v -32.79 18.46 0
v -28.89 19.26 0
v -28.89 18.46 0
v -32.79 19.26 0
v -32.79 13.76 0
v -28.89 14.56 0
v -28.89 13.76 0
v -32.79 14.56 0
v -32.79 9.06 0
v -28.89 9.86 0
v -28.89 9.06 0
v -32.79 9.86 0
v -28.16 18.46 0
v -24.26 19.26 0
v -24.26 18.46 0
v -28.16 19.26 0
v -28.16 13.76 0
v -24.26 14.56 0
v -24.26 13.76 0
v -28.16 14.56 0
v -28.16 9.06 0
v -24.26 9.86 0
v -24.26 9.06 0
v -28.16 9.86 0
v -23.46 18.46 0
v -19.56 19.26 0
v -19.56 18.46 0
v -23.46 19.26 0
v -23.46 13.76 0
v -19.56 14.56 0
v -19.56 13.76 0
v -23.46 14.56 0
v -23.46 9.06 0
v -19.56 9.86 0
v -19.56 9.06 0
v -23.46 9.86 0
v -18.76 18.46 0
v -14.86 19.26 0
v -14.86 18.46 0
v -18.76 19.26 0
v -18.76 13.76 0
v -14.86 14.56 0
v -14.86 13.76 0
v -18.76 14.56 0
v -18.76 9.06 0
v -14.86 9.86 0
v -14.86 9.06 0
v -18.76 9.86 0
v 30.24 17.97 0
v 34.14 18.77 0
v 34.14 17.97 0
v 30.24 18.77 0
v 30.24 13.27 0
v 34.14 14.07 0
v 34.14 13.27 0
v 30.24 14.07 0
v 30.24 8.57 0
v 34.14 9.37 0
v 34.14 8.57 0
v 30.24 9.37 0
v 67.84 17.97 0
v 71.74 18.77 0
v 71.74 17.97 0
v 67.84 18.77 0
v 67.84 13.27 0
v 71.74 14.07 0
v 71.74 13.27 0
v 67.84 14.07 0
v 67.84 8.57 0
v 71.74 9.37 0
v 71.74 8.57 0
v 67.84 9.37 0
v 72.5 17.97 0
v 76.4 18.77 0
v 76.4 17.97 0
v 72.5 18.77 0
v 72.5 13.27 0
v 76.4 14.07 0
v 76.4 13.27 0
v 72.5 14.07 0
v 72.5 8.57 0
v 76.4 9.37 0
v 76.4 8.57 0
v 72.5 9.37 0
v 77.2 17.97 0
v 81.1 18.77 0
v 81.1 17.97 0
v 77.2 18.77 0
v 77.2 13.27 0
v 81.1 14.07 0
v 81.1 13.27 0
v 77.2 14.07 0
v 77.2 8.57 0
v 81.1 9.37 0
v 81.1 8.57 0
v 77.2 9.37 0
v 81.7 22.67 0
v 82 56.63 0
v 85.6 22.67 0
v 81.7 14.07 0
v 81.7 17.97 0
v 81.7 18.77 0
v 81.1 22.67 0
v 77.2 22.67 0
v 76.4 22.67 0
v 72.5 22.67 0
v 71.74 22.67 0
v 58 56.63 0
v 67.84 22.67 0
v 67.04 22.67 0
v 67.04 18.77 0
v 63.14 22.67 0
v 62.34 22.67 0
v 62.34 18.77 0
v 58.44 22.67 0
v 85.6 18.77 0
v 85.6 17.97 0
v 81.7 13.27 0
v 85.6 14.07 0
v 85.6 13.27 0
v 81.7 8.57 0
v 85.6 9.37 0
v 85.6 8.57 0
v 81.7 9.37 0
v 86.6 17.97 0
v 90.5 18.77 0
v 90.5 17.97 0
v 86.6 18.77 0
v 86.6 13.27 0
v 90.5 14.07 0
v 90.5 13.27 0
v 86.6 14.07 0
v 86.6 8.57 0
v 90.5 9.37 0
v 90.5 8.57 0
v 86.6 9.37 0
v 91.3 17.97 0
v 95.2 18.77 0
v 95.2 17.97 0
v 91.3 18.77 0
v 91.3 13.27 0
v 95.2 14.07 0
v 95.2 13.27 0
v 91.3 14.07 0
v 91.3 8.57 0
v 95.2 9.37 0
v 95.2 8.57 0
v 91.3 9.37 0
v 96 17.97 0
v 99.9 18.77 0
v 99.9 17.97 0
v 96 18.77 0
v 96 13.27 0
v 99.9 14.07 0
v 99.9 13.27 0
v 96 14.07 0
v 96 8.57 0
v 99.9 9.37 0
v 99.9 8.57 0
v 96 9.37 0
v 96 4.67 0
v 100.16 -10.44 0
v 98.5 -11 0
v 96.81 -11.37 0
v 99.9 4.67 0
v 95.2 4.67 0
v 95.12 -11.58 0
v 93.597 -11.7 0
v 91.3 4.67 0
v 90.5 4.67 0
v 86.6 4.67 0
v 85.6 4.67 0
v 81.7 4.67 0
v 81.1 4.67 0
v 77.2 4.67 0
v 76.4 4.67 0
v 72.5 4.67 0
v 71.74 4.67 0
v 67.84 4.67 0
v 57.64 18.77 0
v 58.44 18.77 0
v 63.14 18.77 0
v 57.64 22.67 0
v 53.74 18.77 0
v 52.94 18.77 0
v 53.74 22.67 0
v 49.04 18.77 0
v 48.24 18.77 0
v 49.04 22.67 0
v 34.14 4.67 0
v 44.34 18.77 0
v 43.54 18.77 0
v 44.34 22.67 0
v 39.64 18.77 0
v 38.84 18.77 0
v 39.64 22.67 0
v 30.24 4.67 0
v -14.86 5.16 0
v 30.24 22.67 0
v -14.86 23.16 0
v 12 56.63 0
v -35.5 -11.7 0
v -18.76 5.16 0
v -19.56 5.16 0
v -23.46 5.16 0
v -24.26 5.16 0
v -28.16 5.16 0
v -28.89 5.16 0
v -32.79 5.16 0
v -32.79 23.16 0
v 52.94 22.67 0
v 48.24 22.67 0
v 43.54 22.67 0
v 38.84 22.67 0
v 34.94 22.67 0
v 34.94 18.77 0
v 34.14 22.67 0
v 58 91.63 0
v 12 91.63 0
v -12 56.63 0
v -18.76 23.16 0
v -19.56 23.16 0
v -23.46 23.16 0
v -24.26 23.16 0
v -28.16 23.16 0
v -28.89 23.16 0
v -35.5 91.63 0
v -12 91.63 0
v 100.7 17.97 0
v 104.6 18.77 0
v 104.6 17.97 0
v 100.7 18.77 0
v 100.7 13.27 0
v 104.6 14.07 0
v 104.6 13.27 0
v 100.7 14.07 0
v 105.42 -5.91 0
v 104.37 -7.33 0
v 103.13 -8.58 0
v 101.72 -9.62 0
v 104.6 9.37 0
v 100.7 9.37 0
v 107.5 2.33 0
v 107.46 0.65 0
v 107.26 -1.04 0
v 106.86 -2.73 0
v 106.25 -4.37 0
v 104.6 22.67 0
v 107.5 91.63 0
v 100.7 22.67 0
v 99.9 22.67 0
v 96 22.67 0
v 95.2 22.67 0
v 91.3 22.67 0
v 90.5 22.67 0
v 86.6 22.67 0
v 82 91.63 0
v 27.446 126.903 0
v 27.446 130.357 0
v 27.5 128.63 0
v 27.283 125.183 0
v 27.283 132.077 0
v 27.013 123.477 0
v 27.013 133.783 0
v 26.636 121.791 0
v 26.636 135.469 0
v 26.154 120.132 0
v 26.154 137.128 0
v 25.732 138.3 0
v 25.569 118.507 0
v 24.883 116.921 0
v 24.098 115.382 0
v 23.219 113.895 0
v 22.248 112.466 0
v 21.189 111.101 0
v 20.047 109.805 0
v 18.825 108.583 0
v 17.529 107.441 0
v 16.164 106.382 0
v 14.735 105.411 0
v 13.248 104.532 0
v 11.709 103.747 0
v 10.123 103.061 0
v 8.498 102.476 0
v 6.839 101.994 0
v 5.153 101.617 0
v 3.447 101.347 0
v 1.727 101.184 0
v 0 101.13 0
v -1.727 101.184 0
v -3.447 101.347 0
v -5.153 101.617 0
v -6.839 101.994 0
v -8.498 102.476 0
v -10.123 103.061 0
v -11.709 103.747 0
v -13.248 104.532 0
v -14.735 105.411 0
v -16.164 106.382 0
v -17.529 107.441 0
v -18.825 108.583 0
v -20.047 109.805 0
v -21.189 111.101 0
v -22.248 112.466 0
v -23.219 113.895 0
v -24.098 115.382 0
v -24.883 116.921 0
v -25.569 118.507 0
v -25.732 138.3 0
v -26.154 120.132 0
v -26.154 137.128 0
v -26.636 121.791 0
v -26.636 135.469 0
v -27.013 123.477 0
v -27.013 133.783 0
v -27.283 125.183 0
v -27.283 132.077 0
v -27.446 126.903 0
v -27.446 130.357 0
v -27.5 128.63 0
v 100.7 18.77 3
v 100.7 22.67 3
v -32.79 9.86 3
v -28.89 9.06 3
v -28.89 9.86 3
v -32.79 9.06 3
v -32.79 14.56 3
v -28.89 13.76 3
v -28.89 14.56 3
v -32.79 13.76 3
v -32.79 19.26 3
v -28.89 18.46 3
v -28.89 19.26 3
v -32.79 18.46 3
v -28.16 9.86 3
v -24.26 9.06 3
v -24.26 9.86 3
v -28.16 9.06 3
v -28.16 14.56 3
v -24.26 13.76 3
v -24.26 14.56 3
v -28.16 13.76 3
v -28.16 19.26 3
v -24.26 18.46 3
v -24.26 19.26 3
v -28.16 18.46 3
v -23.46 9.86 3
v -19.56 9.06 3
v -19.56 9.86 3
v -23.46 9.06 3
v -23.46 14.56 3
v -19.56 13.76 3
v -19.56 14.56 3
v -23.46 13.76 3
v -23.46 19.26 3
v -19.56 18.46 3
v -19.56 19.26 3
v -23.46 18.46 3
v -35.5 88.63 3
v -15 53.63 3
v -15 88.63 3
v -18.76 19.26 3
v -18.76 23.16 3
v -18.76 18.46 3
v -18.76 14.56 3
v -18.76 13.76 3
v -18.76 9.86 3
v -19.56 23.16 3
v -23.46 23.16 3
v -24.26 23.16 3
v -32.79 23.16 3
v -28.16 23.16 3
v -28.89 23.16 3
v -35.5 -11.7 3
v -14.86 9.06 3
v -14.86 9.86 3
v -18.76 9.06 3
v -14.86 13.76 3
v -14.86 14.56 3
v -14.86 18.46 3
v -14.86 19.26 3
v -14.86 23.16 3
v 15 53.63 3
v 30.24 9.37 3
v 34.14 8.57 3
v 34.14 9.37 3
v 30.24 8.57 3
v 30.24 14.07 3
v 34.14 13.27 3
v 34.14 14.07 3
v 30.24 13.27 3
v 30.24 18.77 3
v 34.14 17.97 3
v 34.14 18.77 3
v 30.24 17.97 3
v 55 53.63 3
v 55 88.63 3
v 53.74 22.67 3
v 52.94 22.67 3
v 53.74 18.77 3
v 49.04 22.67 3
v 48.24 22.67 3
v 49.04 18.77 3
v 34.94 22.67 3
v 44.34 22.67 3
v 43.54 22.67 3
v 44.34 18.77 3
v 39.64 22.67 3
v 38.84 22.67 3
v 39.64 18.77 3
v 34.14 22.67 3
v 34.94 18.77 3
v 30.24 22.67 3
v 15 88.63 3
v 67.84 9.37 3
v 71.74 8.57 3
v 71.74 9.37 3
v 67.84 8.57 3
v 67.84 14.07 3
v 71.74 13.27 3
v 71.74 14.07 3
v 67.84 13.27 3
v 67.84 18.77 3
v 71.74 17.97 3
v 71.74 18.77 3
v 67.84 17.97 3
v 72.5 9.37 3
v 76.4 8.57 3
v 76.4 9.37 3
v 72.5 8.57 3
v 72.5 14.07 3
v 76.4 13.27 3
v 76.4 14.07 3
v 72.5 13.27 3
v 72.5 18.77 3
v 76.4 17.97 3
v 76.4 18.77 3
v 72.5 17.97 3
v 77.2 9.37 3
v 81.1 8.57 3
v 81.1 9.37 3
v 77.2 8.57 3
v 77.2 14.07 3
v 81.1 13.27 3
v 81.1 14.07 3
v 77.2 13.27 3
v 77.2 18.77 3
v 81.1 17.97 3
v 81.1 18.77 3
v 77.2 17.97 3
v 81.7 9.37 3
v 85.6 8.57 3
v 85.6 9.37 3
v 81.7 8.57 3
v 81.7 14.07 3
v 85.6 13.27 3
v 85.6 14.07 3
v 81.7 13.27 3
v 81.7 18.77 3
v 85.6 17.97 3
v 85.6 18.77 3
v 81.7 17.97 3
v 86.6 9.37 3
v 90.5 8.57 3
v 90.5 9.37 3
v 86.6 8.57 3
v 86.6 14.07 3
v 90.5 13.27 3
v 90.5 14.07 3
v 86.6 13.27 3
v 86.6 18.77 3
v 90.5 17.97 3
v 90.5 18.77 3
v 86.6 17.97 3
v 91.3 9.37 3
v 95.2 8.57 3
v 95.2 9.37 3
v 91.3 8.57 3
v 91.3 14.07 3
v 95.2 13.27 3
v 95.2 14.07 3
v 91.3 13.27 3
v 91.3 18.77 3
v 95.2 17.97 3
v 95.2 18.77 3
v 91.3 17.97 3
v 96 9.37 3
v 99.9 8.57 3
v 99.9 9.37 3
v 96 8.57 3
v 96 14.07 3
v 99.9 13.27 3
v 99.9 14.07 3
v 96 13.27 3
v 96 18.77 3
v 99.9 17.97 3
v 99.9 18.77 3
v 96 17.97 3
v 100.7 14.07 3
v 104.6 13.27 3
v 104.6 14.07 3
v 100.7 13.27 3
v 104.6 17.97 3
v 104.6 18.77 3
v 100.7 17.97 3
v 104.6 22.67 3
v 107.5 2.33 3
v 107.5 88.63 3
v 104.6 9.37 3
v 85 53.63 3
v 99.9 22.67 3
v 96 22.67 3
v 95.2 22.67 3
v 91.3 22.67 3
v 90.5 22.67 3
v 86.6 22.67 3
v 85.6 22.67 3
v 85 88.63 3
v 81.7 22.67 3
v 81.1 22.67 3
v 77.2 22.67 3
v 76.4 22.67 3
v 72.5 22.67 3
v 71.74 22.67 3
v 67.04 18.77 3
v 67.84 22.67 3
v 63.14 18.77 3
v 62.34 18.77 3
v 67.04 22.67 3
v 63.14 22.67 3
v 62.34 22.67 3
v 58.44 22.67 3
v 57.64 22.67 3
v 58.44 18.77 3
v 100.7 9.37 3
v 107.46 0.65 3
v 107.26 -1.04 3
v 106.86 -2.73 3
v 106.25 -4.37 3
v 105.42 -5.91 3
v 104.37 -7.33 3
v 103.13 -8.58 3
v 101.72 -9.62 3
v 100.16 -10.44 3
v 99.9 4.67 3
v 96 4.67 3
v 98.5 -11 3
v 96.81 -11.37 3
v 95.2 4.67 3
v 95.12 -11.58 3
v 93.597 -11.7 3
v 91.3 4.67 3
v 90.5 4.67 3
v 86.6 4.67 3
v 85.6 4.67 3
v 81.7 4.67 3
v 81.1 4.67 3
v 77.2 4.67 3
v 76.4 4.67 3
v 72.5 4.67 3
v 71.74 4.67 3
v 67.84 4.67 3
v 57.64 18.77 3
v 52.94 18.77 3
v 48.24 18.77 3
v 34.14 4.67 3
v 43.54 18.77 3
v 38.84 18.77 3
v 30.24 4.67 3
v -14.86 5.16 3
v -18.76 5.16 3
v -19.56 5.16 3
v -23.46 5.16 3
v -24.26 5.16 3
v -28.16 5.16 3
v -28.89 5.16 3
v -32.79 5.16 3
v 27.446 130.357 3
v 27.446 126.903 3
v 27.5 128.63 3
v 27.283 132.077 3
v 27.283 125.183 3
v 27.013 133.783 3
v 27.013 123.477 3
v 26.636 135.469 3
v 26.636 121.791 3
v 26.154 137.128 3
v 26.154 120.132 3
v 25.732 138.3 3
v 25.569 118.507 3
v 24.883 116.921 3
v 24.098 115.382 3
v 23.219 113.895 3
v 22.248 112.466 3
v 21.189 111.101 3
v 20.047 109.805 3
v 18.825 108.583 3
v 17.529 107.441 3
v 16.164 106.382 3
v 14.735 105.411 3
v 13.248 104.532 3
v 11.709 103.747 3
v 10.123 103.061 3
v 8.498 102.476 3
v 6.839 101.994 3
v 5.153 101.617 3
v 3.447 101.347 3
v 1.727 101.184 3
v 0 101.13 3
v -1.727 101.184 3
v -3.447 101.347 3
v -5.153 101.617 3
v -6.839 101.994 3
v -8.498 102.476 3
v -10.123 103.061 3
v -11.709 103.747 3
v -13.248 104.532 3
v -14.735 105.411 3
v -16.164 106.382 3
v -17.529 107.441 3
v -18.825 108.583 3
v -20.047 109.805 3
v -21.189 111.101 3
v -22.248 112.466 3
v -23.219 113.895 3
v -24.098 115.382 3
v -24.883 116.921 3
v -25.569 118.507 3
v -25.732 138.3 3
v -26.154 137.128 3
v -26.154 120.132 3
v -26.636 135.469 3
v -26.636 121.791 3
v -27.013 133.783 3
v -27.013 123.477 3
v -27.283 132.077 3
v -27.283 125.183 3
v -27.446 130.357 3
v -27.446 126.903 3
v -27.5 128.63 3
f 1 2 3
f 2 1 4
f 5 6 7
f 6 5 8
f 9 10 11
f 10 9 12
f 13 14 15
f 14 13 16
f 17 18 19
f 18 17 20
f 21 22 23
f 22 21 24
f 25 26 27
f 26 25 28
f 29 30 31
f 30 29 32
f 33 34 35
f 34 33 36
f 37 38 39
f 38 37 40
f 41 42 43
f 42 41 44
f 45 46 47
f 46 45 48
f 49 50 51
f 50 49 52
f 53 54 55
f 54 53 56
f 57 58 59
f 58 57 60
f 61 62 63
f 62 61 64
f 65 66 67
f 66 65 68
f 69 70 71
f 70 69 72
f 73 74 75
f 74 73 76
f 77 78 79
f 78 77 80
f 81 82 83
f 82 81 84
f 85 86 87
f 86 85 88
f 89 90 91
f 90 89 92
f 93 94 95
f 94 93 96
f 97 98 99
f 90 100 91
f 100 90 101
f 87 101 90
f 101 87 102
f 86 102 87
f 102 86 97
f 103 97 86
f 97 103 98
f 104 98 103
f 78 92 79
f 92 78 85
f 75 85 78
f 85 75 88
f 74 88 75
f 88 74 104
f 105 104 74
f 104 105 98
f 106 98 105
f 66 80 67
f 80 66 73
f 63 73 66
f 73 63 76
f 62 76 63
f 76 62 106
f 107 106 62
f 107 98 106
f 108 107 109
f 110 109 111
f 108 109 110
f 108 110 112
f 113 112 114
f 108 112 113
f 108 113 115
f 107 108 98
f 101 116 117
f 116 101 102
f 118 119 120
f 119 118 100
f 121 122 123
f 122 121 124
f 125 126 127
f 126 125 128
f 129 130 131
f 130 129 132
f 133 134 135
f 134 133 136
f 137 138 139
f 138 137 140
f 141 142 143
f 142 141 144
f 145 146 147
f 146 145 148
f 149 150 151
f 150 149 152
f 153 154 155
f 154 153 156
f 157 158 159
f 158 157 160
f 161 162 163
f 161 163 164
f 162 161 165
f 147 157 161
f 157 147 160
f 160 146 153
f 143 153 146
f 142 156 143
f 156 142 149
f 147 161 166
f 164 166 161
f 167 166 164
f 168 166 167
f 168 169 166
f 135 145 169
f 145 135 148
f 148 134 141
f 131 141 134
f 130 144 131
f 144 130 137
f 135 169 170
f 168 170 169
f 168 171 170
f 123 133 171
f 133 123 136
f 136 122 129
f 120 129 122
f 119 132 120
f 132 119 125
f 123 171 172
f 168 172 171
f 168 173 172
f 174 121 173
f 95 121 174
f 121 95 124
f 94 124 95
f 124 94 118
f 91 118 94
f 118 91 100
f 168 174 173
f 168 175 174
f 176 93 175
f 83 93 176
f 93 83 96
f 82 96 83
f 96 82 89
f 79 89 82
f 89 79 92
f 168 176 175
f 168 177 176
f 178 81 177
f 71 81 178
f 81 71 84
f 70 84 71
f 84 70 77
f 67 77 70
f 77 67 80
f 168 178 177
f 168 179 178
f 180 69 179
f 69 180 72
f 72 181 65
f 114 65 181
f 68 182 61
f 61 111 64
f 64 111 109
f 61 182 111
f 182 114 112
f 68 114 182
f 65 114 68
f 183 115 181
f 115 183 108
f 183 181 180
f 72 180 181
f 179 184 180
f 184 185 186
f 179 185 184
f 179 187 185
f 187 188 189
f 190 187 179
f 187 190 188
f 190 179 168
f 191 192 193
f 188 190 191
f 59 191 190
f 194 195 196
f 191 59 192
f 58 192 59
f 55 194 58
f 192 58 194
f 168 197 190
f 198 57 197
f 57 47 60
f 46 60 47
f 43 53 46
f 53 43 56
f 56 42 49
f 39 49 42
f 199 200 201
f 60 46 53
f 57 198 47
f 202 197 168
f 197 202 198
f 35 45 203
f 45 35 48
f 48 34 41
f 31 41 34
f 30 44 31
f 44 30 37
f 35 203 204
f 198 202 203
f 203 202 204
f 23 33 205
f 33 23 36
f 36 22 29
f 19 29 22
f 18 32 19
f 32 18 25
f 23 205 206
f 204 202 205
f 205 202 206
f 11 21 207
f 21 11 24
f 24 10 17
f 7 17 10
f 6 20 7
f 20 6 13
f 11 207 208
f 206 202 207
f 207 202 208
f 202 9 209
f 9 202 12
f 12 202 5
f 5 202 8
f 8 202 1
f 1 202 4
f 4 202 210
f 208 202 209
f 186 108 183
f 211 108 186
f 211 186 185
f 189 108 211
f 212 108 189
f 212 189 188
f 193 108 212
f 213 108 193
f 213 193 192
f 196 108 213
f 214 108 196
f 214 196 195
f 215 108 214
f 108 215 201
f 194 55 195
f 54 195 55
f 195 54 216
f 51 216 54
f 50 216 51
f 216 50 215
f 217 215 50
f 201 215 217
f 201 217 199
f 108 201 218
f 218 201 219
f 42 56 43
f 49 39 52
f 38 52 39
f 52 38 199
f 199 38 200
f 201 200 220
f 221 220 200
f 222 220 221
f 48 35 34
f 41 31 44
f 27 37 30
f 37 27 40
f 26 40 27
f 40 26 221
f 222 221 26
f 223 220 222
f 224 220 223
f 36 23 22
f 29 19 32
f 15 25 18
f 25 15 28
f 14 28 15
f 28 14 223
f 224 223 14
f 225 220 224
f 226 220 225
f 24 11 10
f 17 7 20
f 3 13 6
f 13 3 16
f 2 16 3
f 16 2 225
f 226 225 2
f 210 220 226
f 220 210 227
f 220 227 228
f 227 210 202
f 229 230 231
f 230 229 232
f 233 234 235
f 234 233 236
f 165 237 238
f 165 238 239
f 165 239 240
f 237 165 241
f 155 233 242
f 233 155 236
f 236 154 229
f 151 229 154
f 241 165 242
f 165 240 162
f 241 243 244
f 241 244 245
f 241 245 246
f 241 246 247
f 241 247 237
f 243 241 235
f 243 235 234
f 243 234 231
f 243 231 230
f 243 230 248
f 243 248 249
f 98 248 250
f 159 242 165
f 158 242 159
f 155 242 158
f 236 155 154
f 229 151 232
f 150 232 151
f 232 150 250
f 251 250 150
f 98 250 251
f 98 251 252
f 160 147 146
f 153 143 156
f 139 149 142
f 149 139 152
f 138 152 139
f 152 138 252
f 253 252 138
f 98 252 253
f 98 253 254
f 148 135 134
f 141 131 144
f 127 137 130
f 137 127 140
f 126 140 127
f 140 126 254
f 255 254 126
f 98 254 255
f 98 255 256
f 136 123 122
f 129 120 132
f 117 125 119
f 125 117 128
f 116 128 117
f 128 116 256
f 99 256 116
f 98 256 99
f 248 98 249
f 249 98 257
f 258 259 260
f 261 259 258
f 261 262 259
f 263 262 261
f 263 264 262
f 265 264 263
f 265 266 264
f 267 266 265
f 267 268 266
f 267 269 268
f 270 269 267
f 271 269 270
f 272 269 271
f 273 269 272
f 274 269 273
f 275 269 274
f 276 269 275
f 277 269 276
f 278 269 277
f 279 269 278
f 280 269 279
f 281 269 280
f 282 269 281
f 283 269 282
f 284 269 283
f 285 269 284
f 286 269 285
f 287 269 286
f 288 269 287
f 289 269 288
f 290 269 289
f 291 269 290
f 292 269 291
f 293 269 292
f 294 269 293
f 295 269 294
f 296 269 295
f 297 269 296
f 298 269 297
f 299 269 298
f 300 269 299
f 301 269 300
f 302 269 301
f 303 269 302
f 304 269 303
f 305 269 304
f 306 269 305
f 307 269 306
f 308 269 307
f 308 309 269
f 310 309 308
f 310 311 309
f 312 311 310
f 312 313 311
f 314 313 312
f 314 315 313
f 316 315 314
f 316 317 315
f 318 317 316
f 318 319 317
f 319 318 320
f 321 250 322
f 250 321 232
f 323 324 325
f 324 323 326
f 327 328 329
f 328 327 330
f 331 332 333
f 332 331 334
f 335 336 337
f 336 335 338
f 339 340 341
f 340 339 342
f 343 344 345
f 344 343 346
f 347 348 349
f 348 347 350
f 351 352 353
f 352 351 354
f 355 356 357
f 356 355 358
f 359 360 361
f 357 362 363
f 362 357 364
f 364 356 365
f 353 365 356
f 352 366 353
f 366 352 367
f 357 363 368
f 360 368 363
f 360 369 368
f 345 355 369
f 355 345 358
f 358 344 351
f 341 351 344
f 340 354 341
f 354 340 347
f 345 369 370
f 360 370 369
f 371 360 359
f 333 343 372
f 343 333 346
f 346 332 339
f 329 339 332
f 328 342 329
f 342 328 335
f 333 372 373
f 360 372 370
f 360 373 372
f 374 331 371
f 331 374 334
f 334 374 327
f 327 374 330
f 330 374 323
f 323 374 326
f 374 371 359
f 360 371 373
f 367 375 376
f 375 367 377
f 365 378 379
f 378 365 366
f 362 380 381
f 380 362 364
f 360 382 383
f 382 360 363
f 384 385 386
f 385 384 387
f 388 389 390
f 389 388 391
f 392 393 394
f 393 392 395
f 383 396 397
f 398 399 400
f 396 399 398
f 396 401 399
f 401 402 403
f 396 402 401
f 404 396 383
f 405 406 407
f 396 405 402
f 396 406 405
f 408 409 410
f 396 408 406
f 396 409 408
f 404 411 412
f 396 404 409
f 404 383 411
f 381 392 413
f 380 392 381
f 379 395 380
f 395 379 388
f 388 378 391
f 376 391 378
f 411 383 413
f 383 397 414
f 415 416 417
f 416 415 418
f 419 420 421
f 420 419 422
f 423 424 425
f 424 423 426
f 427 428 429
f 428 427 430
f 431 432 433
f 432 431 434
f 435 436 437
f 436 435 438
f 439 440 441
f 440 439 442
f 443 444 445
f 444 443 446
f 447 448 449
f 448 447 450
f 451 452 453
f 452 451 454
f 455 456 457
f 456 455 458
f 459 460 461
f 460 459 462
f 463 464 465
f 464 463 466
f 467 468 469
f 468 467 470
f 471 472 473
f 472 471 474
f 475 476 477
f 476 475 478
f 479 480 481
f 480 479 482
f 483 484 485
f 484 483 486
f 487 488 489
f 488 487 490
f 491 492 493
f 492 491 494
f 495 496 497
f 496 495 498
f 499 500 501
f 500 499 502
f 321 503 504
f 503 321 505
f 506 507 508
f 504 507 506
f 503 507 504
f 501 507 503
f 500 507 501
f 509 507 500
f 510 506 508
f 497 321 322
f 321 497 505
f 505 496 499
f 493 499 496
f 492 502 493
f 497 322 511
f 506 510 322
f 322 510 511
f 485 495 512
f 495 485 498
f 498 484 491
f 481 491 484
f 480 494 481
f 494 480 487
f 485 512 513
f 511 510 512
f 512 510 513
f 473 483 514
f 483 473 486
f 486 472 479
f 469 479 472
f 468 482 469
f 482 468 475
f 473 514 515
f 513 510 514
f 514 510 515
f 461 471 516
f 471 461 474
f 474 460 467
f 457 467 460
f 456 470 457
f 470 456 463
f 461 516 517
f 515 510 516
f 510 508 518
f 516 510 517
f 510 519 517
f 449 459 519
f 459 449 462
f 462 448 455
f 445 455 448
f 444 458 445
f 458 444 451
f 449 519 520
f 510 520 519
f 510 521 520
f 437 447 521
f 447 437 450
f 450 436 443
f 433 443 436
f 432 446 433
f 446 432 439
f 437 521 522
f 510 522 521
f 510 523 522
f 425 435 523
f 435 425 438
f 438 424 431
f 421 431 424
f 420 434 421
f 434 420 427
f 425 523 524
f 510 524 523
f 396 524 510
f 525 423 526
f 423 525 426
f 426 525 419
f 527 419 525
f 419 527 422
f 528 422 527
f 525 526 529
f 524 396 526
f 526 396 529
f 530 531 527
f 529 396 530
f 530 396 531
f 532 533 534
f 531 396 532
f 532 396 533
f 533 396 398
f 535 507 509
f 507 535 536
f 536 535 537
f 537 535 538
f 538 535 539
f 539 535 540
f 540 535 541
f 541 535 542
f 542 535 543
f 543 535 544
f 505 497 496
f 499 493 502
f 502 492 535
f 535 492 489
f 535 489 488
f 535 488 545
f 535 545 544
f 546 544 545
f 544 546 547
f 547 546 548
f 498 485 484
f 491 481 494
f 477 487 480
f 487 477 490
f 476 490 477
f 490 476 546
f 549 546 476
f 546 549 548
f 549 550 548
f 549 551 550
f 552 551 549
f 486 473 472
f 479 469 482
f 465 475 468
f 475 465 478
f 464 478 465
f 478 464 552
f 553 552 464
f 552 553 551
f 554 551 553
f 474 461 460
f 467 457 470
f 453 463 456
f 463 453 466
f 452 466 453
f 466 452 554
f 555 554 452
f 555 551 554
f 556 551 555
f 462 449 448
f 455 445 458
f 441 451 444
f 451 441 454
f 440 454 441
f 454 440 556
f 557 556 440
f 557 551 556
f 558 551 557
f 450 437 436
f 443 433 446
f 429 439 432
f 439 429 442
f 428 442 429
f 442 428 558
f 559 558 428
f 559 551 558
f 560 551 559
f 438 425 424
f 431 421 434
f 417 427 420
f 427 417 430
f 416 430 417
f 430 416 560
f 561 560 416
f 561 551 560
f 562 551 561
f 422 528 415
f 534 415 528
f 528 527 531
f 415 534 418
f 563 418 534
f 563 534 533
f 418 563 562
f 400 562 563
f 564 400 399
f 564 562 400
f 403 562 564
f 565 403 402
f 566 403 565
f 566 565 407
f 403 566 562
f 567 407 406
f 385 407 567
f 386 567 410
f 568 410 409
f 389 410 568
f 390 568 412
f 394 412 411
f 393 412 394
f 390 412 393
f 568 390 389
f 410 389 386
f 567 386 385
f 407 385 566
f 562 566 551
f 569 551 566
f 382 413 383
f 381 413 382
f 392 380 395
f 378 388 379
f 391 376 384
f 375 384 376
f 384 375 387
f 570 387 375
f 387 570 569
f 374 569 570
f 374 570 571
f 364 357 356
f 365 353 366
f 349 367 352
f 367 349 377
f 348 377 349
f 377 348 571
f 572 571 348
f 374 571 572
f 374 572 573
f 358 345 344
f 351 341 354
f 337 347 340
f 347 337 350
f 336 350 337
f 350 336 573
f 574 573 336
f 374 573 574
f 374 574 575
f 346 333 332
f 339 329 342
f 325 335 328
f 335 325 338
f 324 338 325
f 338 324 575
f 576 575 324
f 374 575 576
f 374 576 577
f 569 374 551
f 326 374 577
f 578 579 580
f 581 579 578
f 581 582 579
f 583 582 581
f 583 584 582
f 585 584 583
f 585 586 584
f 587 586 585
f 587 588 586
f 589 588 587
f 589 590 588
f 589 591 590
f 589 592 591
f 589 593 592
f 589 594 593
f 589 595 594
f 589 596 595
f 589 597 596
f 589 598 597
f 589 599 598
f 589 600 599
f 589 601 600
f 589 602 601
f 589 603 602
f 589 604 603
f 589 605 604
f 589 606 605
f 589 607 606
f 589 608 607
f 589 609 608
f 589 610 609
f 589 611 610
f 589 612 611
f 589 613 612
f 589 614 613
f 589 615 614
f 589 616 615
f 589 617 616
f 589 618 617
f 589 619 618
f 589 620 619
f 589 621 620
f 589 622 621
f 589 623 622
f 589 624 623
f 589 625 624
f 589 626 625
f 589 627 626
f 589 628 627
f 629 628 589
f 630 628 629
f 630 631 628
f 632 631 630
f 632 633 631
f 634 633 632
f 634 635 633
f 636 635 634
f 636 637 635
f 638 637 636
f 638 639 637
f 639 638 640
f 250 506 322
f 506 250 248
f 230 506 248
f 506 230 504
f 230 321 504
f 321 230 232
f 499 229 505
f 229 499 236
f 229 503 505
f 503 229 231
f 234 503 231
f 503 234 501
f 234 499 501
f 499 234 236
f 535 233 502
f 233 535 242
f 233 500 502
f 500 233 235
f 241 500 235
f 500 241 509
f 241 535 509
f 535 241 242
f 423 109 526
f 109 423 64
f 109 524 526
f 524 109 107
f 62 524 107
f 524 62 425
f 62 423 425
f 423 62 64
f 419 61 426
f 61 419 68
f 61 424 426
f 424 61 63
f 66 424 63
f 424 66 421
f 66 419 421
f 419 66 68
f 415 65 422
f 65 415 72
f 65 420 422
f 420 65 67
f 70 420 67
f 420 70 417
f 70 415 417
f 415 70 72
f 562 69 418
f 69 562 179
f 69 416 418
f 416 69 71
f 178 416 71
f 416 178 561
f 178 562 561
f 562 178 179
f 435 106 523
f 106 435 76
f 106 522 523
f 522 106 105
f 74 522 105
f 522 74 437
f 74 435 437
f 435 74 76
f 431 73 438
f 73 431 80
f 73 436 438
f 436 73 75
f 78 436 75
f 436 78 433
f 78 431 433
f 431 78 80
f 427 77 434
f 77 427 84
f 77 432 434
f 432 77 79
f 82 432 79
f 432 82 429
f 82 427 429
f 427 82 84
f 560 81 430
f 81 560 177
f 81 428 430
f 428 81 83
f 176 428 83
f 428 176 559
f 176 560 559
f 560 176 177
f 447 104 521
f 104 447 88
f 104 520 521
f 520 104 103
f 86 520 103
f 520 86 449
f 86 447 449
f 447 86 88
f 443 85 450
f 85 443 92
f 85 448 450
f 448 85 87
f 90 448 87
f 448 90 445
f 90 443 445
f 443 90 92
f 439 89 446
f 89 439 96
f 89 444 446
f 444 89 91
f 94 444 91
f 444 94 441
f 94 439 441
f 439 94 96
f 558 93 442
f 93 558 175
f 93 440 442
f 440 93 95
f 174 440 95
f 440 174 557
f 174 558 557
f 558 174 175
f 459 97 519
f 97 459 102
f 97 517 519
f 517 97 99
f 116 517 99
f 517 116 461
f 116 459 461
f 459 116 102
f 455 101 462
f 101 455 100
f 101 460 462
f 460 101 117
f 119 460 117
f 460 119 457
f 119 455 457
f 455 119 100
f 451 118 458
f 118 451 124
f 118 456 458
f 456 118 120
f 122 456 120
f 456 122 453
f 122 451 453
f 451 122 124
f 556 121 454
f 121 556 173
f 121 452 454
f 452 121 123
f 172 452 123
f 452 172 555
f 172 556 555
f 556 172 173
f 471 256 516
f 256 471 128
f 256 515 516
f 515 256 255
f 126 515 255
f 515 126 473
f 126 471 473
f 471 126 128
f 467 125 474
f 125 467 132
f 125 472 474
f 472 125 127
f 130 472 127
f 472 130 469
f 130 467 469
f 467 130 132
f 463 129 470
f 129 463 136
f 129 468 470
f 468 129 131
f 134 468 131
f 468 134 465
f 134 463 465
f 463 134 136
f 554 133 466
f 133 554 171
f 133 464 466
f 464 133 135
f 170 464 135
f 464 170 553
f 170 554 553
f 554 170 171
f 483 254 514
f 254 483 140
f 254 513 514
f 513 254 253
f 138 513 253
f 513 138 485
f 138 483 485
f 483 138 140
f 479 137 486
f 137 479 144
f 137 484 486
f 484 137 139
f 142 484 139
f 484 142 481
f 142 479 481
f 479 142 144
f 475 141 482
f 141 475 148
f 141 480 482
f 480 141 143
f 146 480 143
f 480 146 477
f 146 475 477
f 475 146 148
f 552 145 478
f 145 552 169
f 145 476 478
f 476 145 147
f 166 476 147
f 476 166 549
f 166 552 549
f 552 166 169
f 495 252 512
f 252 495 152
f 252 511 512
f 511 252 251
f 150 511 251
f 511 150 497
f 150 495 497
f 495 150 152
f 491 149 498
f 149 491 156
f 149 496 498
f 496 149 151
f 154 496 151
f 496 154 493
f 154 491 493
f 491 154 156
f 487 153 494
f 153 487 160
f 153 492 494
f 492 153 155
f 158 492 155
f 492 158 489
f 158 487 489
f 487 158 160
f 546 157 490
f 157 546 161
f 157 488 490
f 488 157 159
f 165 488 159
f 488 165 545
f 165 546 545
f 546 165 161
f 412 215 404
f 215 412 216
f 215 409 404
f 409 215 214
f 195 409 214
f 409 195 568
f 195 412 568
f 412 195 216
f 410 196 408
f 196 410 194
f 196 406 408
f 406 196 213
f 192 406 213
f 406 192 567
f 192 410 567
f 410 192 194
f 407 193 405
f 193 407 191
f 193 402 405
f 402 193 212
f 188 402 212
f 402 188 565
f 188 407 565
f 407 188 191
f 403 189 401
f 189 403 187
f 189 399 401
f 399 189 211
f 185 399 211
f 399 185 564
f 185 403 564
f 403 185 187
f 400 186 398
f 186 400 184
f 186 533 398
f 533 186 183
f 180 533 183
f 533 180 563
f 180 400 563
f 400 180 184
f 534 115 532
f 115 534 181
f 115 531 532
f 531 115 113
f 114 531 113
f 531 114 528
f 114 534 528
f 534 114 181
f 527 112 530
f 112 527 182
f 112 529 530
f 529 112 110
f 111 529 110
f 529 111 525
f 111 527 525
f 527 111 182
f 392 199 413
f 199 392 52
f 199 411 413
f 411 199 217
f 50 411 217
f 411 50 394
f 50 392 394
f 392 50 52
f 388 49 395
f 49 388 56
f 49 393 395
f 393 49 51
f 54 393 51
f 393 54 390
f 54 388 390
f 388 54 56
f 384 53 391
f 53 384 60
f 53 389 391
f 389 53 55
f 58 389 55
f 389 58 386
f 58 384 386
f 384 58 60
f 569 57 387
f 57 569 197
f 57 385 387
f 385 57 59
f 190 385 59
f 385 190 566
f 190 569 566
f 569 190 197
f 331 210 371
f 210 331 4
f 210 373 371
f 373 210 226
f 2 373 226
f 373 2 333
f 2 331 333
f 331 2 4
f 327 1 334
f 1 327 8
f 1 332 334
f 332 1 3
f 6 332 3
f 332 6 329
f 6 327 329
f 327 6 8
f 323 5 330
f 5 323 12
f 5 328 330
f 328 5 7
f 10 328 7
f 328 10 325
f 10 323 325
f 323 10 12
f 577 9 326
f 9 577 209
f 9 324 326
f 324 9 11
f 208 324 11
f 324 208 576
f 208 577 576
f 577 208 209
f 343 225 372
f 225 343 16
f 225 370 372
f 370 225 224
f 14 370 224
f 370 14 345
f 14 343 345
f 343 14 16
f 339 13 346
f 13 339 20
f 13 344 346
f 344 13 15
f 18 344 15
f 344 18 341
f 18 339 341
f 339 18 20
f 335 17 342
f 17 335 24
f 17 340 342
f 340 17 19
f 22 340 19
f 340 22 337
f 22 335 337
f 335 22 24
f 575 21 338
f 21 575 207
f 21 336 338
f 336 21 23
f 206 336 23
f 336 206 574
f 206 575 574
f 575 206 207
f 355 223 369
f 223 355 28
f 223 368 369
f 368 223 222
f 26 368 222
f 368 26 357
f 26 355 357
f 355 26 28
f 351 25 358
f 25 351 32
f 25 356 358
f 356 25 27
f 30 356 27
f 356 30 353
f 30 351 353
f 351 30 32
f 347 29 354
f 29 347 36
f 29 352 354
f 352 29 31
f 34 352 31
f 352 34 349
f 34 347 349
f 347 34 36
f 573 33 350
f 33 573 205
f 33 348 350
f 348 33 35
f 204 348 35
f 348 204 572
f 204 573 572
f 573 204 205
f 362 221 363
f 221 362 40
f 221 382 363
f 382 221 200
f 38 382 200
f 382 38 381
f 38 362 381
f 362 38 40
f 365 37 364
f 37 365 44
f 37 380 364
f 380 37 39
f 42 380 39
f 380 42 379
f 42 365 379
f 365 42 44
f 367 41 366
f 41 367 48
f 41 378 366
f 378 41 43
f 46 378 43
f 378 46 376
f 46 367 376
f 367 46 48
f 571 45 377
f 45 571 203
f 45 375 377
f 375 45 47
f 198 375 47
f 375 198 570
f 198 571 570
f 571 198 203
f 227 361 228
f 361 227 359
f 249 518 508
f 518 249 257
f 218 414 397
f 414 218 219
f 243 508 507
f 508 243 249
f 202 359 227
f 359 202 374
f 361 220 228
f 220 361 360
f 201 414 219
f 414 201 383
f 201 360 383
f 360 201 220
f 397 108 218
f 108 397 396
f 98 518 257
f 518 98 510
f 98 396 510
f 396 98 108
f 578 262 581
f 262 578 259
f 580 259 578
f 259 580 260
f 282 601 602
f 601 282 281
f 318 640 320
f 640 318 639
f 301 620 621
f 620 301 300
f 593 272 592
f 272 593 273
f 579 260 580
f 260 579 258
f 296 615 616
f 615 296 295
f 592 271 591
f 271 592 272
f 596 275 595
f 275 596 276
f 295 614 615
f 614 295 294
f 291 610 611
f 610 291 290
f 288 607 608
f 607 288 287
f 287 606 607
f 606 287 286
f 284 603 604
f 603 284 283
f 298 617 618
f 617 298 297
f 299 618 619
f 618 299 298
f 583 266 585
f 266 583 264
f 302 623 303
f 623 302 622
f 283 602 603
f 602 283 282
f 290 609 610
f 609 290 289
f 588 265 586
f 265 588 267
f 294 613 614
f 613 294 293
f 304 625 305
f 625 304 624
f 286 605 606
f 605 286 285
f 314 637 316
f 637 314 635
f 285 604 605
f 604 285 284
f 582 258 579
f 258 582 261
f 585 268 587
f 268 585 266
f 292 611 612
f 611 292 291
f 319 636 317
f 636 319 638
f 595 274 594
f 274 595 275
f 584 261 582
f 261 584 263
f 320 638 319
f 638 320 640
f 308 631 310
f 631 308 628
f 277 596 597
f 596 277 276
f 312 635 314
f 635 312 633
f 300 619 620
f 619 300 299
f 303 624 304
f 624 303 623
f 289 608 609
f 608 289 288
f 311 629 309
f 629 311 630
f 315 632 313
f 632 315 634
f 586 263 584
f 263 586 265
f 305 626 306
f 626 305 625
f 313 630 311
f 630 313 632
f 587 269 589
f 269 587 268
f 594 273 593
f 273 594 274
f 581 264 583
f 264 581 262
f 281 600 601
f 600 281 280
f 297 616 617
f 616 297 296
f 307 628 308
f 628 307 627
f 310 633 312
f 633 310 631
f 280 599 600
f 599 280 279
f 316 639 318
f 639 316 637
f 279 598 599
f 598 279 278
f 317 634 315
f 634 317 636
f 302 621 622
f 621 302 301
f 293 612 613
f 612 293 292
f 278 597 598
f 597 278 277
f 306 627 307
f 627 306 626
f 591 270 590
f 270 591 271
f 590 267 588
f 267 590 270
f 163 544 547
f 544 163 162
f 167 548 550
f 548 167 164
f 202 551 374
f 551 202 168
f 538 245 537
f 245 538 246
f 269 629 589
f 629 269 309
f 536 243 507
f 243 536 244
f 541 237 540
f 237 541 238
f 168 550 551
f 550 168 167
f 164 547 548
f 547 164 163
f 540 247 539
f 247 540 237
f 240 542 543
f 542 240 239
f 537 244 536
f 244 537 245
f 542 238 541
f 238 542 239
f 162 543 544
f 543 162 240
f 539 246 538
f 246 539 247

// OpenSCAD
th = 3.0;
lg = 500;
plg = 150;

module corner() {
    translate([-18.79, -18.79]) polygon([
        [18.79, 0.0], [18.79, 1.56], [18.79, 3.13], [18.79, 4.76], 
        [18.75, 6.44], [18.55, 8.13], [18.15, 9.82], [17.54, 11.46], 
        [16.71, 13.0], [15.66, 14.42], [14.42, 15.67], [13.01, 16.71], 
        [11.45, 17.53], [9.79, 18.09], [8.1, 18.46], [6.41, 18.67], 
        [4.76, 18.8], [3.15, 18.86], [1.56, 18.86], [0.0, 18.79],
        [18.79, 18.79]
    ]);
}

module mag() {
    linear_extrude(3.0) square(3.9, center=true);
}

module slot(dx, dy) {
    sd = 3; // shrink dimension
    
//    translate([dx/2, dy/2])
//    linear_extrude(th, scale=[(dx-sd*2)/dx, (dy-sd*2)/dy])
//        square([dx, dy], center=true);
    
    linear_extrude(th, scale=[dx/(dx-sd*2), dy/(dy-sd*2)])
        square([dx-sd*2, dy-sd*2], center=true);
    
}

// ipad 11inch dimension: 178.52 x 247.64 mm
// ipad 12.9inch dimension: 215.00 x 280.66 mm
// smart connector dimensions are the same
// smart connector center plate to the closest edge distance: 10 + 3.4/2 = 11.7mm

module lower_part_centered_plate_2d() {
    mirror([1,0,0]) translate([-215.00/2,-11.7]) difference() {
        square([143, plg]);
        rotate(180) corner();
    }
}

module upper_part_centered_plate_2d() {
    w = plg;// plate width
    mirror([1,0,0]) translate([-215.00/2,280.66-11.7-w]) difference() {
        square([143, w]);
        translate([0,w]) mirror([0,1]) difference() {
            c = 33; // cut square side length
            r = 6;
            square(c);
            translate([c-13.41,c-13.41]) polygon([[13.41, 0.0], [13.41, 1.11], [13.41, 2.24], [13.41, 3.4], [13.42, 4.61], [13.39, 5.87], [13.24, 7.16], [12.92, 8.44], [12.39, 9.65], [11.65, 10.73], [10.73, 11.65], [9.65, 12.39], [8.44, 12.92], [7.16, 13.24], [5.87, 13.39], [4.61, 13.42], [3.4, 13.41], [2.24, 13.41], [1.11, 13.41], [0.0, 13.41], [13.41,13.41]]);
            
            //mirror([0,1]) rotate(180) corner();
        }
    }
}

module lower_part_magnets() {
    for(ty=[20.72, 16.02, 11.32])
        translate([102.65,ty]) mag(); // right-most 1x3  
    
    for (tx=[69.79, 74.45, 79.15, 83.65, 88.55, 93.25, 97.95], ty=[20.72, 16.02, 11.32, 6.62])
        translate([tx,ty]) mag(); // right 4x7
    
    // import numpy as np; np.linspace(36.89, 65.09, 7)
    for (tx=[36.89, 41.59, 46.29, 50.99, 55.69, 60.39, 65.09])
        translate([tx, 20.72]) mag(); // right 7x1
    
    for(ty=[20.72, 16.02, 11.32, 6.62])
        translate([32.19,ty]) mag(); // right-most 1x4 
    
    for (tx=[-30.84, -26.21, -21.51, -21.51+4.7], ty=[21.21, 16.51, 11.81, 7.11])
        translate([tx,ty]) mag(); // left 4x4
}

module lower_part(){
    difference() {
        linear_extrude(th) lower_part_centered_plate_2d();
        #lower_part_magnets();
        
        center_part();
    }
}

//lower_part();

module upper_part_magnets() {
    for (tx=[-30.91, -26.21, -21.51, -21.57+4.7], ty=[235.83, 240.53, 245.23, 249.93])
        translate([tx,ty]) mag(); // 4x4
    
    for(ty=[237.18, 241.88, 246.58, 251.28])
        translate([32.19,ty]) mag(); // 1x4 
    
    // import numpy as np; np.linspace(37.47, 65.87, 7)
    for (tx=[37.47, 42.20, 46.94, 51.67, 56.4, 61.14, 65.87])
        translate([tx, 237.18]) mag(); // right 7x1
    
    for(ty=[237.18, 241.88, 246.58, 251.28])
        translate([70.57,ty]) mag(); // 1x4 
}

module center_part(mx=0, my=0) {
    translate([0,0,0]) translate([0,280.66/2-11.7,0]) difference() {
        union() {
            translate([0,0,0]) slot(30-2*mx, 150-2*my);
            translate([70,0,0]) slot(30-2*mx, 150-2*my);
            intersection() {
                slot(lg, 80-2*my);
                linear_extrude(th) mirror([1,0,0]) translate([-215.00/2, -200]) square([143, 400]);
            }
        }
        cylinder(d=55, h=th, $fn=100);
    }
}

module upper_part() {
    difference() {
        linear_extrude(th) upper_part_centered_plate_2d();
        #upper_part_magnets();
        
        center_part();
    }
}  

lower_part();
//translate([0,-150,0]) 

//upper_part();

// intersection() {
    
// center_part(0.2, 0.2);
// // translate([0,70,0]) cube([50, 50, 50], center=true);
// }
